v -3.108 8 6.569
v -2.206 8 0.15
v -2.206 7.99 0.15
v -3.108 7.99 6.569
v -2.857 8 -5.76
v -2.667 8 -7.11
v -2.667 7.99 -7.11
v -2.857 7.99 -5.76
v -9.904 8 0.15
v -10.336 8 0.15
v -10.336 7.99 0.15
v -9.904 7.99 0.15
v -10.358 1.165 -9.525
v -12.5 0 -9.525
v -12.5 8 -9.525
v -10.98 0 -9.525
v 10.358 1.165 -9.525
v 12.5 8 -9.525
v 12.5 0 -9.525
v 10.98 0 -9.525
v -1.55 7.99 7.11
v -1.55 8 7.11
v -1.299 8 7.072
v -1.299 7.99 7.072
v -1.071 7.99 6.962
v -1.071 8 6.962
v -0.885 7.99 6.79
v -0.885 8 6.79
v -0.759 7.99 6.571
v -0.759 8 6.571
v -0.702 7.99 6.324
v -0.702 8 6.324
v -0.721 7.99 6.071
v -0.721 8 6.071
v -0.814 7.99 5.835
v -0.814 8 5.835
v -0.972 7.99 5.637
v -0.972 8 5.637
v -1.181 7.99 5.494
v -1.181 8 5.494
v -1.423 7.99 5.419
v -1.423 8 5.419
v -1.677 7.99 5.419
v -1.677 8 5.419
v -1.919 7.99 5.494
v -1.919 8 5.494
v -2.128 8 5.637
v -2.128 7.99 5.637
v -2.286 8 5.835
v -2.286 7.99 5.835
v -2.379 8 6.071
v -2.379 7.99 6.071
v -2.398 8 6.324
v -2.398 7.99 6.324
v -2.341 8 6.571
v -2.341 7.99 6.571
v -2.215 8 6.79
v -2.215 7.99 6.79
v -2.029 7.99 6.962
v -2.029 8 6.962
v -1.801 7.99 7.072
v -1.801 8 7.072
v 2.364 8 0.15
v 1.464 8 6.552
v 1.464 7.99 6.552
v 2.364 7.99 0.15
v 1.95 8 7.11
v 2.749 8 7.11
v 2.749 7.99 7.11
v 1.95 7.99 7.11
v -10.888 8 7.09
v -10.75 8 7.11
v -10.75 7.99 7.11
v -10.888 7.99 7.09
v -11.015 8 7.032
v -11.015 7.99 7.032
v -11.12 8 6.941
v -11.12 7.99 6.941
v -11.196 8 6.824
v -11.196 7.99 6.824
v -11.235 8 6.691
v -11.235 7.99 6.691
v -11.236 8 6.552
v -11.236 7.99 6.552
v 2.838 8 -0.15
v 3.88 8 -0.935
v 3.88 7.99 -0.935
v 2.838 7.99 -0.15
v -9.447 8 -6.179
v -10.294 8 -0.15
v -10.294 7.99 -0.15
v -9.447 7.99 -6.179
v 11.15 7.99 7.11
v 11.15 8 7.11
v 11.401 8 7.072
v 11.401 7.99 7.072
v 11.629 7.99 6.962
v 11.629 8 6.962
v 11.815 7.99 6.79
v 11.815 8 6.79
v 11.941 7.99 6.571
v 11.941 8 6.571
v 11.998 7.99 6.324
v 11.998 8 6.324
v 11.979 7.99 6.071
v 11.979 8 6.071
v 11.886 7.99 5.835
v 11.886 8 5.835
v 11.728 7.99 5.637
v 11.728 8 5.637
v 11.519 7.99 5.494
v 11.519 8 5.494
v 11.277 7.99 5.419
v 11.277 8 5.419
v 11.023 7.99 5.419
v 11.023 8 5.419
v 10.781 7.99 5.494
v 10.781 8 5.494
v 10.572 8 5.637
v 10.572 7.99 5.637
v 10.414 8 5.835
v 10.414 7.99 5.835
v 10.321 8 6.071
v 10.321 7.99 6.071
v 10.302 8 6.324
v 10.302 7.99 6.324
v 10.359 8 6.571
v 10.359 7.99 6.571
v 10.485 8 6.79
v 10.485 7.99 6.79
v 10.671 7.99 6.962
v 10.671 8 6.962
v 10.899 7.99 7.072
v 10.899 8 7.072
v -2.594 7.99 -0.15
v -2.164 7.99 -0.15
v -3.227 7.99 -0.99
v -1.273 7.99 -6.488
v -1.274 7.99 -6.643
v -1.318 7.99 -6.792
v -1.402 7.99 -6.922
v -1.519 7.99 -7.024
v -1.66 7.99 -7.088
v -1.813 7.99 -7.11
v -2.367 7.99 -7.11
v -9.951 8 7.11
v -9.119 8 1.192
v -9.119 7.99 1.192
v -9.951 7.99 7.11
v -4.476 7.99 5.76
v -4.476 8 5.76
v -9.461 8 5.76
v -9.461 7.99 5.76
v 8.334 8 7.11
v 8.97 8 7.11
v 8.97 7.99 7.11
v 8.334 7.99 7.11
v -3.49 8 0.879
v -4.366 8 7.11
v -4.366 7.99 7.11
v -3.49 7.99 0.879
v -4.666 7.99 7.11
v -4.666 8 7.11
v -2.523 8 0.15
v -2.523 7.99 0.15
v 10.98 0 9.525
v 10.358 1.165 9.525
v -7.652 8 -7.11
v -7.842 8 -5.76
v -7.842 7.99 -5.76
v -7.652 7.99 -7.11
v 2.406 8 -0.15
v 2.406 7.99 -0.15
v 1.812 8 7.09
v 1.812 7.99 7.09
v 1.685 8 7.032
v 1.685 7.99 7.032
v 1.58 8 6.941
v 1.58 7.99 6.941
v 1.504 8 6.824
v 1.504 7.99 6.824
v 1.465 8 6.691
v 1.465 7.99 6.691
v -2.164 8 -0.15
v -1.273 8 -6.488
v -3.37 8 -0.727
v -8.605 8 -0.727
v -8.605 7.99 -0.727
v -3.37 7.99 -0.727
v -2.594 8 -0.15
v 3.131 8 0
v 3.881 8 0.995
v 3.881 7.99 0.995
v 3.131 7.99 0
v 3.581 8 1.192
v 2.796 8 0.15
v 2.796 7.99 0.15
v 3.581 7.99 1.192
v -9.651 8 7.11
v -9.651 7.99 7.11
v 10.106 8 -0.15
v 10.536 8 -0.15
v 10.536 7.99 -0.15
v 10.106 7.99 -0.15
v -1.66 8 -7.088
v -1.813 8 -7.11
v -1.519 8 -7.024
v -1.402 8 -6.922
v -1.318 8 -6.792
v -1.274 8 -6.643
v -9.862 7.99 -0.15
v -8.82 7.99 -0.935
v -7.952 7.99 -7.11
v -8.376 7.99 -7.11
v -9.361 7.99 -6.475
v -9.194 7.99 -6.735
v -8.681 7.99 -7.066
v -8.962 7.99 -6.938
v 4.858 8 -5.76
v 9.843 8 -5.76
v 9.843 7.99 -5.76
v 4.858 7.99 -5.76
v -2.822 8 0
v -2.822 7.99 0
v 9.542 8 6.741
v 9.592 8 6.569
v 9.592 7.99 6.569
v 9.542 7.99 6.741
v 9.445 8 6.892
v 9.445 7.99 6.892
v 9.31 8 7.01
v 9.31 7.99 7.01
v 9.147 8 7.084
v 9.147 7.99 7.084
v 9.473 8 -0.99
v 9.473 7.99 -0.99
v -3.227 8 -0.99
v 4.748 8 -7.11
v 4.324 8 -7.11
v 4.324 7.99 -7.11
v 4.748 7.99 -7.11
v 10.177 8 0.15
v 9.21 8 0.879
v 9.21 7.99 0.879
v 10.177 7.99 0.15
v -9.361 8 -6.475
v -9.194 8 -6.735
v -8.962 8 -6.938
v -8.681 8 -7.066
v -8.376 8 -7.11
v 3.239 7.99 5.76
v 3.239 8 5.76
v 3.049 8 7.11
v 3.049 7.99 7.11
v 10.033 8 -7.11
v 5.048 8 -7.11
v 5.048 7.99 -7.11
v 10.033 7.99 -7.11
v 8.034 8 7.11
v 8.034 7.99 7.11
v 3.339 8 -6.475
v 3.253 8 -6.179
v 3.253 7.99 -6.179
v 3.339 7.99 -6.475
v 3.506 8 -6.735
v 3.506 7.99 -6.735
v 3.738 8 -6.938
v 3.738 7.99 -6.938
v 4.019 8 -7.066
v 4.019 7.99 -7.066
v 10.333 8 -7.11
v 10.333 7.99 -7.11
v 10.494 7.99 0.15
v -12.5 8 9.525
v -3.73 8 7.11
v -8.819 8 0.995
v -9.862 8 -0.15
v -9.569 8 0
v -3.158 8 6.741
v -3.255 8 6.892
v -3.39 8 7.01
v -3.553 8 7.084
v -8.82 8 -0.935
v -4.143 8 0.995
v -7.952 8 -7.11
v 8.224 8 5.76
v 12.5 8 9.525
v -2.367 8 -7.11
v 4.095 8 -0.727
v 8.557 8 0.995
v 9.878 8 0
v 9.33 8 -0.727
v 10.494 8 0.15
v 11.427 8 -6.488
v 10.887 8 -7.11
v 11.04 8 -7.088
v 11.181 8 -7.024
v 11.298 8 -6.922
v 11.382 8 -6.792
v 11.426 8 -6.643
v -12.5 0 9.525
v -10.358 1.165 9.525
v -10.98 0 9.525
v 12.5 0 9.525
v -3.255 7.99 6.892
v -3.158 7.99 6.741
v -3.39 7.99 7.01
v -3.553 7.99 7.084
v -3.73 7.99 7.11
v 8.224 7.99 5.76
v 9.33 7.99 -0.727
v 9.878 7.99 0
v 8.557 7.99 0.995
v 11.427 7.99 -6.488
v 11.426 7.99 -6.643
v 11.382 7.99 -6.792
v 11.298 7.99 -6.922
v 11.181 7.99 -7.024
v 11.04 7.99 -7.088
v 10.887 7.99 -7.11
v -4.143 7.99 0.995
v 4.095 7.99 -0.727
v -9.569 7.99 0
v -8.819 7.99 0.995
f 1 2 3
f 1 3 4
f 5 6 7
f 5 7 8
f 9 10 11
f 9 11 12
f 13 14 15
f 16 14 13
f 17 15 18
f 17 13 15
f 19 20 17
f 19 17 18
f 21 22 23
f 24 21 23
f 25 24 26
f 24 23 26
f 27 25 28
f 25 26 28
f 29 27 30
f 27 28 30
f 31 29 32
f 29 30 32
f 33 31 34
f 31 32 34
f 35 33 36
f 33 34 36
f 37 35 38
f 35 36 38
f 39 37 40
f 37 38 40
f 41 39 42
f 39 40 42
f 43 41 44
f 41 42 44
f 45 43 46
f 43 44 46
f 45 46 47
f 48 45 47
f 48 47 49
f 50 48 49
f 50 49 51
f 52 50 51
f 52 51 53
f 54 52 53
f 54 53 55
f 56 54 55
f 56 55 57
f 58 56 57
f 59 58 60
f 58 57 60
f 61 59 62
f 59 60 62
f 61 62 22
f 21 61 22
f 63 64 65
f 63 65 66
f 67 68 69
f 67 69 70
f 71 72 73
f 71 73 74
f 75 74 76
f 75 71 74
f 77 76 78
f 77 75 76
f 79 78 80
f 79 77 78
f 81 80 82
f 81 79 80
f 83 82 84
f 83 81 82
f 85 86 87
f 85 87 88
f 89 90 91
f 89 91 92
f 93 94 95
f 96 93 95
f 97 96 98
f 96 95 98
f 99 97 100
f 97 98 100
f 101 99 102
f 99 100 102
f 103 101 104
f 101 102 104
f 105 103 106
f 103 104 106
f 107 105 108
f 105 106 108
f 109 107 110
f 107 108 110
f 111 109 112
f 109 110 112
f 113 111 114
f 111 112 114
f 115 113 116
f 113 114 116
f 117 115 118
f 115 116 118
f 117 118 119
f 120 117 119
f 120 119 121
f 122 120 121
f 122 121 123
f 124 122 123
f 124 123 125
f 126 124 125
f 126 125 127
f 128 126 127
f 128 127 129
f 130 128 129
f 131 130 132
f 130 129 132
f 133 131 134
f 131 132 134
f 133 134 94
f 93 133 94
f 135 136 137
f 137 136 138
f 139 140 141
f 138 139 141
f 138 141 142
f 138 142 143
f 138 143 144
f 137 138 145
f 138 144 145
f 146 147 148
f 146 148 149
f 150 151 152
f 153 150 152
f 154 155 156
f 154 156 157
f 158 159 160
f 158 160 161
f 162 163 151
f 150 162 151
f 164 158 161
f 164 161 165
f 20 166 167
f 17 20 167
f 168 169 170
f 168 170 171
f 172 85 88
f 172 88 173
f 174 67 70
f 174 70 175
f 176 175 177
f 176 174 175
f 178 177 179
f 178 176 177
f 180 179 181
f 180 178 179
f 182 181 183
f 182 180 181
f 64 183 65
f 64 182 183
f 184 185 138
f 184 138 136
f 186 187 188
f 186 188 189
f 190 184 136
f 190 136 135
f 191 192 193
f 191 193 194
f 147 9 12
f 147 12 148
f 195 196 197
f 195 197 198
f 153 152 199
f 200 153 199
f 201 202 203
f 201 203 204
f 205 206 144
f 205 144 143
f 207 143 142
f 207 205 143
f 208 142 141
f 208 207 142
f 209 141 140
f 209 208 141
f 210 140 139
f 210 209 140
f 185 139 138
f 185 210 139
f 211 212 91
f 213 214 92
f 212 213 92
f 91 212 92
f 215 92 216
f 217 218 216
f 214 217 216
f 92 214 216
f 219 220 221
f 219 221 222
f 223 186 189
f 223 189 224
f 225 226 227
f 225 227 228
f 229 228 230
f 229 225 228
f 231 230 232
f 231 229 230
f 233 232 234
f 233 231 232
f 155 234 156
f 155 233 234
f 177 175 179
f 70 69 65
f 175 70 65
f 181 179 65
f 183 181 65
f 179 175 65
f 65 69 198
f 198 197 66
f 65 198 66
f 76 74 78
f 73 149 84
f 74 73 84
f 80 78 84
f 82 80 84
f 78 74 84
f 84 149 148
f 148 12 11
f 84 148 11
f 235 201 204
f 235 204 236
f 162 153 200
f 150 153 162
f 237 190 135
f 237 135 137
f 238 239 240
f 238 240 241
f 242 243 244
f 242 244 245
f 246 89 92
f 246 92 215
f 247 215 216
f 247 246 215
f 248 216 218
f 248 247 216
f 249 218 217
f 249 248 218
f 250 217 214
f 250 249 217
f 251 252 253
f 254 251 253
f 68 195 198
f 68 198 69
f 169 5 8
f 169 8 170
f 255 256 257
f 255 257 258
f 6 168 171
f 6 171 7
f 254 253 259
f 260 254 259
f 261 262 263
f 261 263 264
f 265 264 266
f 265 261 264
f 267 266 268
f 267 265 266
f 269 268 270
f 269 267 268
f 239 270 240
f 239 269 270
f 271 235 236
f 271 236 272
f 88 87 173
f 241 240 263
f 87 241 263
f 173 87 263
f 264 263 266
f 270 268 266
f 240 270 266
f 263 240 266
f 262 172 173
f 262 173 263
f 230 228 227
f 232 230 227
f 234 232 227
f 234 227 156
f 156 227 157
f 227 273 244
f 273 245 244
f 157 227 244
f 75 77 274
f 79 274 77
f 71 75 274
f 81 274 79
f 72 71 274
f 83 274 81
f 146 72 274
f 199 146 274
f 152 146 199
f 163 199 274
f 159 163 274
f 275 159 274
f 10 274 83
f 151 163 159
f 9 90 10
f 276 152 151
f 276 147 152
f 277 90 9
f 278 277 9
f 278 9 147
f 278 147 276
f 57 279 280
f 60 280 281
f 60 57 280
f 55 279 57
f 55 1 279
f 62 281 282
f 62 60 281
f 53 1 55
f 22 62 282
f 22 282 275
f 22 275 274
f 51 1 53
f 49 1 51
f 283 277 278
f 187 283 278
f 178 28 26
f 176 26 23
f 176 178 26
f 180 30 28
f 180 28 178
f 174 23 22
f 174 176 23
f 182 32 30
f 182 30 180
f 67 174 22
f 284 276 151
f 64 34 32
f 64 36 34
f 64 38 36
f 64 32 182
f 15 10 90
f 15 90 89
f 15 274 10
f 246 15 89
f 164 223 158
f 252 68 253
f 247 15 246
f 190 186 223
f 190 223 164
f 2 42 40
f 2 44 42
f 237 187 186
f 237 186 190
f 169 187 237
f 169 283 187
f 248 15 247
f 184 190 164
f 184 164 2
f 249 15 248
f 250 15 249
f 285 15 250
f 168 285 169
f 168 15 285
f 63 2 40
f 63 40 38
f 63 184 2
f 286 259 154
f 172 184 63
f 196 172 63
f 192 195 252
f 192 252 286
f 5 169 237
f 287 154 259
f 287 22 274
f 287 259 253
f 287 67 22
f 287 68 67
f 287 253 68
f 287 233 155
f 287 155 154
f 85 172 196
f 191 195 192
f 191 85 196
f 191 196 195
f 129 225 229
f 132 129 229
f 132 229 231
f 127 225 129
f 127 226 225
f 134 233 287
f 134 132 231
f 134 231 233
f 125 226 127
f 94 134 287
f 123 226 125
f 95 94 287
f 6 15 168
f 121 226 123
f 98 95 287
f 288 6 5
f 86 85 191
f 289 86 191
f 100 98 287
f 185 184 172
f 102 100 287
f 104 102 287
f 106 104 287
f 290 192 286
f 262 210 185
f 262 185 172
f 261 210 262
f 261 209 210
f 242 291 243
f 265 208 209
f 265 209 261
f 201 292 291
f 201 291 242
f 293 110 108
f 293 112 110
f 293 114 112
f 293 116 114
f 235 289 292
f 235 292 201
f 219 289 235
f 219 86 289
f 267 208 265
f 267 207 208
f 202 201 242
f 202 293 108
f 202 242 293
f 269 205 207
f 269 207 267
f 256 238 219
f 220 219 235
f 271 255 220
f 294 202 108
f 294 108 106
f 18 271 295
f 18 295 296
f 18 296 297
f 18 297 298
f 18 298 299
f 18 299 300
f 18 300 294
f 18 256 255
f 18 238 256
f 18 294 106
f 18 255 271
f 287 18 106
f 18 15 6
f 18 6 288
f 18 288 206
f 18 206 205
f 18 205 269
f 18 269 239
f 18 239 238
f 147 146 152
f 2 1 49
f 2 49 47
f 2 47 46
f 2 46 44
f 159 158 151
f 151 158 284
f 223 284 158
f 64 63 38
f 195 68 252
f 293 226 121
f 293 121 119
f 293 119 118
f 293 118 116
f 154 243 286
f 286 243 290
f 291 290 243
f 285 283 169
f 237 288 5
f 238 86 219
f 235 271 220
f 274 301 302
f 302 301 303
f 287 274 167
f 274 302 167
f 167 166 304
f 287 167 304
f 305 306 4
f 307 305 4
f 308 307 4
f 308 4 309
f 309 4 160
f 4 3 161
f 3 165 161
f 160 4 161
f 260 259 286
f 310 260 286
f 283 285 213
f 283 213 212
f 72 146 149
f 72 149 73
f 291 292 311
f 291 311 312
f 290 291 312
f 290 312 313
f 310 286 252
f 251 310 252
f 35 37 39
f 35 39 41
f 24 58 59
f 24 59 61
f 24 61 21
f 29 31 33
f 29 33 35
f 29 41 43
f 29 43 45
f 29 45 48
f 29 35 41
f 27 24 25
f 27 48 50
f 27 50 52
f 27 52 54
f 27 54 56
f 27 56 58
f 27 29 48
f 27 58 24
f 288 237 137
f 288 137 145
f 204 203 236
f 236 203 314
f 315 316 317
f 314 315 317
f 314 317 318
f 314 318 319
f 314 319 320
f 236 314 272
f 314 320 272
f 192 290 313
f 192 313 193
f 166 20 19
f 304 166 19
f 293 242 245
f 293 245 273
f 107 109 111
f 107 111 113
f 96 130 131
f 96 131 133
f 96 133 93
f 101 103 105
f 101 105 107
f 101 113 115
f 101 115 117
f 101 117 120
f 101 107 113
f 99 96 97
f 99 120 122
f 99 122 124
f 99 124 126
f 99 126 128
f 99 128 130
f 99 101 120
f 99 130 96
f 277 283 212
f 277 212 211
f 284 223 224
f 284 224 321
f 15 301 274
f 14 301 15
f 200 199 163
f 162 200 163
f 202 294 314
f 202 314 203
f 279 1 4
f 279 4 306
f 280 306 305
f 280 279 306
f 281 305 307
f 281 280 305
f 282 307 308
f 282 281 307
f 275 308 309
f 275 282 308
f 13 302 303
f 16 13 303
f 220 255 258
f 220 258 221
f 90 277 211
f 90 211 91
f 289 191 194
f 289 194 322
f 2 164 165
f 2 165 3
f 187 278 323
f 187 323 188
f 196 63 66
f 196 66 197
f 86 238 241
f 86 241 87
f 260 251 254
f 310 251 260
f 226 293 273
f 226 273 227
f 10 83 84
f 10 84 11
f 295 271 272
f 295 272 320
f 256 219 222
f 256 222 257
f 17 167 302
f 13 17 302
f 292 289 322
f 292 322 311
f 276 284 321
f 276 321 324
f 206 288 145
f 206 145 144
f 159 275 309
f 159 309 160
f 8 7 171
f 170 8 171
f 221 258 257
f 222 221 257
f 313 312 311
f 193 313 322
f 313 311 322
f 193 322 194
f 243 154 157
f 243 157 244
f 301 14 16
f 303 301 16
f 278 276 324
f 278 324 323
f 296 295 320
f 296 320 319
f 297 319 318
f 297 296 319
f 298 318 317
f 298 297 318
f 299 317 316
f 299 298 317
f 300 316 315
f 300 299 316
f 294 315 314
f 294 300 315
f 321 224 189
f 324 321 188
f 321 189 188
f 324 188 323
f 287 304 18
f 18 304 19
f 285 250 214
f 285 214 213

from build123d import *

# Parameters (mm, degrees)
SKETCH1_W           = 25
SKETCH1_H           = 19.05
BOSS_EXTRUDE1_DEPTH = 8
CUT_EXTRUDE1_DEPTH  = 25.148550681
SKETCH3_R           = 0.85
CUT_EXTRUDE3_DEPTH  = 0.01
LPATTERN2_COUNT     = 2
LPATTERN2_PITCH     = 12.7


with BuildPart() as part:
    # Sketch1 → Boss-Extrude1 (new body)
    with BuildSketch(Plane(origin=(0, 0, 0), x_dir=(1, 0, 0), z_dir=(0, 1, 0))):
        Rectangle(SKETCH1_W, SKETCH1_H)
    extrude(amount=BOSS_EXTRUDE1_DEPTH)

    # Sketch2 → Cut-Extrude1 (cut, through all)
    with BuildSketch(Plane.XY.offset(9.525)):
        Polygon((-10.357683229, 1.165391541), (-10.979622637, 0), (10.979622637, 0), (10.357683229, 1.165391541), align=None)
    extrude(amount=-CUT_EXTRUDE1_DEPTH, mode=Mode.SUBTRACT)

    # Sketch3 → Cut-Extrude3 (cut)
    with BuildSketch(Plane(origin=(0, 8, 0), x_dir=(1, 0, 0), z_dir=(0, 1, 0))):
        with Locations(Location((-1.55, -6.26, 0), (0, 0, 270))):
            Circle(SKETCH3_R)
        with BuildLine():
            Line((-10.293918875, 0.15), (-9.446582946, 6.179108414))
            ThreePointArc((-9.446582946, 6.179108414), (-9.085171861, 6.844744827), (-8.375714675, 7.11))
            Line((-8.375714675, 7.11), (-7.952487442, 7.11))
            Line((-7.952487442, 7.11), (-8.820313991, 0.935093249))
            Line((-8.820313991, 0.935093249), (-9.862167922, 0.15))
            Line((-9.862167922, 0.15), (-10.293918875, 0.15))
        make_face()
        with BuildLine():
            Line((-2.367186588, 7.11), (-1.813478843, 7.11))
            ThreePointArc((-1.813478843, 7.11), (-1.401654728, 6.922320938), (-1.273116986, 6.488384791))
            Line((-1.273116986, 6.488384791), (-2.163918875, 0.15))
            Line((-2.163918875, 0.15), (-2.593918875, 0.15))
            Line((-2.593918875, 0.15), (-3.227234844, 0.990438678))
            Line((-3.227234844, 0.990438678), (-2.367186588, 7.11))
        make_face()
        Polygon((-7.652487442, 7.11), (-2.667186588, 7.11), (-2.856916715, 5.76), (-7.842217569, 5.76), align=None)
        Polygon((-8.604632176, 0.726571417), (-3.369972607, 0.726571417), (-2.822461773, 0), (-4.142522346, -0.994736992), (-8.819236923, -0.994736992), (-9.568825012, 0), align=None)
        with BuildLine():
            Line((-10.336081125, -0.15), (-9.904330172, -0.15))
            Line((-9.904330172, -0.15), (-9.119236923, -1.191853931))
            Line((-9.119236923, -1.191853931), (-9.950978112, -7.11))
            Line((-9.950978112, -7.11), (-10.750461652, -7.11))
            ThreePointArc((-10.750461652, -7.11), (-11.120337027, -6.94143808), (-11.235781811, -6.551703021))
            Line((-11.235781811, -6.551703021), (-10.336081125, -0.15))
        make_face()
        Polygon((-9.650978112, -7.11), (-4.665677257, -7.11), (-4.47594713, -5.76), (-9.461247985, -5.76), align=None)
        with BuildLine():
            Line((-2.206081125, -0.15), (-3.108270084, -6.569408002))
            ThreePointArc((-3.108270084, -6.569408002), (-3.318150529, -6.955959695), (-3.730150039, -7.11))
            Line((-3.730150039, -7.11), (-4.365677257, -7.11))
            Line((-4.365677257, -7.11), (-3.489911075, -0.878599823))
            Line((-3.489911075, -0.878599823), (-2.523026453, -0.15))
            Line((-2.523026453, -0.15), (-2.206081125, -0.15))
        make_face()
    cut_extrude3 = extrude(amount=-CUT_EXTRUDE3_DEPTH, mode=Mode.SUBTRACT)

    # LPattern2: Cut-Extrude3 ×2
    with Locations(*[(i * LPATTERN2_PITCH, 0, 0) for i in range(1, LPATTERN2_COUNT)]):
        add(cut_extrude3, mode=Mode.SUBTRACT)


solid = part.part
